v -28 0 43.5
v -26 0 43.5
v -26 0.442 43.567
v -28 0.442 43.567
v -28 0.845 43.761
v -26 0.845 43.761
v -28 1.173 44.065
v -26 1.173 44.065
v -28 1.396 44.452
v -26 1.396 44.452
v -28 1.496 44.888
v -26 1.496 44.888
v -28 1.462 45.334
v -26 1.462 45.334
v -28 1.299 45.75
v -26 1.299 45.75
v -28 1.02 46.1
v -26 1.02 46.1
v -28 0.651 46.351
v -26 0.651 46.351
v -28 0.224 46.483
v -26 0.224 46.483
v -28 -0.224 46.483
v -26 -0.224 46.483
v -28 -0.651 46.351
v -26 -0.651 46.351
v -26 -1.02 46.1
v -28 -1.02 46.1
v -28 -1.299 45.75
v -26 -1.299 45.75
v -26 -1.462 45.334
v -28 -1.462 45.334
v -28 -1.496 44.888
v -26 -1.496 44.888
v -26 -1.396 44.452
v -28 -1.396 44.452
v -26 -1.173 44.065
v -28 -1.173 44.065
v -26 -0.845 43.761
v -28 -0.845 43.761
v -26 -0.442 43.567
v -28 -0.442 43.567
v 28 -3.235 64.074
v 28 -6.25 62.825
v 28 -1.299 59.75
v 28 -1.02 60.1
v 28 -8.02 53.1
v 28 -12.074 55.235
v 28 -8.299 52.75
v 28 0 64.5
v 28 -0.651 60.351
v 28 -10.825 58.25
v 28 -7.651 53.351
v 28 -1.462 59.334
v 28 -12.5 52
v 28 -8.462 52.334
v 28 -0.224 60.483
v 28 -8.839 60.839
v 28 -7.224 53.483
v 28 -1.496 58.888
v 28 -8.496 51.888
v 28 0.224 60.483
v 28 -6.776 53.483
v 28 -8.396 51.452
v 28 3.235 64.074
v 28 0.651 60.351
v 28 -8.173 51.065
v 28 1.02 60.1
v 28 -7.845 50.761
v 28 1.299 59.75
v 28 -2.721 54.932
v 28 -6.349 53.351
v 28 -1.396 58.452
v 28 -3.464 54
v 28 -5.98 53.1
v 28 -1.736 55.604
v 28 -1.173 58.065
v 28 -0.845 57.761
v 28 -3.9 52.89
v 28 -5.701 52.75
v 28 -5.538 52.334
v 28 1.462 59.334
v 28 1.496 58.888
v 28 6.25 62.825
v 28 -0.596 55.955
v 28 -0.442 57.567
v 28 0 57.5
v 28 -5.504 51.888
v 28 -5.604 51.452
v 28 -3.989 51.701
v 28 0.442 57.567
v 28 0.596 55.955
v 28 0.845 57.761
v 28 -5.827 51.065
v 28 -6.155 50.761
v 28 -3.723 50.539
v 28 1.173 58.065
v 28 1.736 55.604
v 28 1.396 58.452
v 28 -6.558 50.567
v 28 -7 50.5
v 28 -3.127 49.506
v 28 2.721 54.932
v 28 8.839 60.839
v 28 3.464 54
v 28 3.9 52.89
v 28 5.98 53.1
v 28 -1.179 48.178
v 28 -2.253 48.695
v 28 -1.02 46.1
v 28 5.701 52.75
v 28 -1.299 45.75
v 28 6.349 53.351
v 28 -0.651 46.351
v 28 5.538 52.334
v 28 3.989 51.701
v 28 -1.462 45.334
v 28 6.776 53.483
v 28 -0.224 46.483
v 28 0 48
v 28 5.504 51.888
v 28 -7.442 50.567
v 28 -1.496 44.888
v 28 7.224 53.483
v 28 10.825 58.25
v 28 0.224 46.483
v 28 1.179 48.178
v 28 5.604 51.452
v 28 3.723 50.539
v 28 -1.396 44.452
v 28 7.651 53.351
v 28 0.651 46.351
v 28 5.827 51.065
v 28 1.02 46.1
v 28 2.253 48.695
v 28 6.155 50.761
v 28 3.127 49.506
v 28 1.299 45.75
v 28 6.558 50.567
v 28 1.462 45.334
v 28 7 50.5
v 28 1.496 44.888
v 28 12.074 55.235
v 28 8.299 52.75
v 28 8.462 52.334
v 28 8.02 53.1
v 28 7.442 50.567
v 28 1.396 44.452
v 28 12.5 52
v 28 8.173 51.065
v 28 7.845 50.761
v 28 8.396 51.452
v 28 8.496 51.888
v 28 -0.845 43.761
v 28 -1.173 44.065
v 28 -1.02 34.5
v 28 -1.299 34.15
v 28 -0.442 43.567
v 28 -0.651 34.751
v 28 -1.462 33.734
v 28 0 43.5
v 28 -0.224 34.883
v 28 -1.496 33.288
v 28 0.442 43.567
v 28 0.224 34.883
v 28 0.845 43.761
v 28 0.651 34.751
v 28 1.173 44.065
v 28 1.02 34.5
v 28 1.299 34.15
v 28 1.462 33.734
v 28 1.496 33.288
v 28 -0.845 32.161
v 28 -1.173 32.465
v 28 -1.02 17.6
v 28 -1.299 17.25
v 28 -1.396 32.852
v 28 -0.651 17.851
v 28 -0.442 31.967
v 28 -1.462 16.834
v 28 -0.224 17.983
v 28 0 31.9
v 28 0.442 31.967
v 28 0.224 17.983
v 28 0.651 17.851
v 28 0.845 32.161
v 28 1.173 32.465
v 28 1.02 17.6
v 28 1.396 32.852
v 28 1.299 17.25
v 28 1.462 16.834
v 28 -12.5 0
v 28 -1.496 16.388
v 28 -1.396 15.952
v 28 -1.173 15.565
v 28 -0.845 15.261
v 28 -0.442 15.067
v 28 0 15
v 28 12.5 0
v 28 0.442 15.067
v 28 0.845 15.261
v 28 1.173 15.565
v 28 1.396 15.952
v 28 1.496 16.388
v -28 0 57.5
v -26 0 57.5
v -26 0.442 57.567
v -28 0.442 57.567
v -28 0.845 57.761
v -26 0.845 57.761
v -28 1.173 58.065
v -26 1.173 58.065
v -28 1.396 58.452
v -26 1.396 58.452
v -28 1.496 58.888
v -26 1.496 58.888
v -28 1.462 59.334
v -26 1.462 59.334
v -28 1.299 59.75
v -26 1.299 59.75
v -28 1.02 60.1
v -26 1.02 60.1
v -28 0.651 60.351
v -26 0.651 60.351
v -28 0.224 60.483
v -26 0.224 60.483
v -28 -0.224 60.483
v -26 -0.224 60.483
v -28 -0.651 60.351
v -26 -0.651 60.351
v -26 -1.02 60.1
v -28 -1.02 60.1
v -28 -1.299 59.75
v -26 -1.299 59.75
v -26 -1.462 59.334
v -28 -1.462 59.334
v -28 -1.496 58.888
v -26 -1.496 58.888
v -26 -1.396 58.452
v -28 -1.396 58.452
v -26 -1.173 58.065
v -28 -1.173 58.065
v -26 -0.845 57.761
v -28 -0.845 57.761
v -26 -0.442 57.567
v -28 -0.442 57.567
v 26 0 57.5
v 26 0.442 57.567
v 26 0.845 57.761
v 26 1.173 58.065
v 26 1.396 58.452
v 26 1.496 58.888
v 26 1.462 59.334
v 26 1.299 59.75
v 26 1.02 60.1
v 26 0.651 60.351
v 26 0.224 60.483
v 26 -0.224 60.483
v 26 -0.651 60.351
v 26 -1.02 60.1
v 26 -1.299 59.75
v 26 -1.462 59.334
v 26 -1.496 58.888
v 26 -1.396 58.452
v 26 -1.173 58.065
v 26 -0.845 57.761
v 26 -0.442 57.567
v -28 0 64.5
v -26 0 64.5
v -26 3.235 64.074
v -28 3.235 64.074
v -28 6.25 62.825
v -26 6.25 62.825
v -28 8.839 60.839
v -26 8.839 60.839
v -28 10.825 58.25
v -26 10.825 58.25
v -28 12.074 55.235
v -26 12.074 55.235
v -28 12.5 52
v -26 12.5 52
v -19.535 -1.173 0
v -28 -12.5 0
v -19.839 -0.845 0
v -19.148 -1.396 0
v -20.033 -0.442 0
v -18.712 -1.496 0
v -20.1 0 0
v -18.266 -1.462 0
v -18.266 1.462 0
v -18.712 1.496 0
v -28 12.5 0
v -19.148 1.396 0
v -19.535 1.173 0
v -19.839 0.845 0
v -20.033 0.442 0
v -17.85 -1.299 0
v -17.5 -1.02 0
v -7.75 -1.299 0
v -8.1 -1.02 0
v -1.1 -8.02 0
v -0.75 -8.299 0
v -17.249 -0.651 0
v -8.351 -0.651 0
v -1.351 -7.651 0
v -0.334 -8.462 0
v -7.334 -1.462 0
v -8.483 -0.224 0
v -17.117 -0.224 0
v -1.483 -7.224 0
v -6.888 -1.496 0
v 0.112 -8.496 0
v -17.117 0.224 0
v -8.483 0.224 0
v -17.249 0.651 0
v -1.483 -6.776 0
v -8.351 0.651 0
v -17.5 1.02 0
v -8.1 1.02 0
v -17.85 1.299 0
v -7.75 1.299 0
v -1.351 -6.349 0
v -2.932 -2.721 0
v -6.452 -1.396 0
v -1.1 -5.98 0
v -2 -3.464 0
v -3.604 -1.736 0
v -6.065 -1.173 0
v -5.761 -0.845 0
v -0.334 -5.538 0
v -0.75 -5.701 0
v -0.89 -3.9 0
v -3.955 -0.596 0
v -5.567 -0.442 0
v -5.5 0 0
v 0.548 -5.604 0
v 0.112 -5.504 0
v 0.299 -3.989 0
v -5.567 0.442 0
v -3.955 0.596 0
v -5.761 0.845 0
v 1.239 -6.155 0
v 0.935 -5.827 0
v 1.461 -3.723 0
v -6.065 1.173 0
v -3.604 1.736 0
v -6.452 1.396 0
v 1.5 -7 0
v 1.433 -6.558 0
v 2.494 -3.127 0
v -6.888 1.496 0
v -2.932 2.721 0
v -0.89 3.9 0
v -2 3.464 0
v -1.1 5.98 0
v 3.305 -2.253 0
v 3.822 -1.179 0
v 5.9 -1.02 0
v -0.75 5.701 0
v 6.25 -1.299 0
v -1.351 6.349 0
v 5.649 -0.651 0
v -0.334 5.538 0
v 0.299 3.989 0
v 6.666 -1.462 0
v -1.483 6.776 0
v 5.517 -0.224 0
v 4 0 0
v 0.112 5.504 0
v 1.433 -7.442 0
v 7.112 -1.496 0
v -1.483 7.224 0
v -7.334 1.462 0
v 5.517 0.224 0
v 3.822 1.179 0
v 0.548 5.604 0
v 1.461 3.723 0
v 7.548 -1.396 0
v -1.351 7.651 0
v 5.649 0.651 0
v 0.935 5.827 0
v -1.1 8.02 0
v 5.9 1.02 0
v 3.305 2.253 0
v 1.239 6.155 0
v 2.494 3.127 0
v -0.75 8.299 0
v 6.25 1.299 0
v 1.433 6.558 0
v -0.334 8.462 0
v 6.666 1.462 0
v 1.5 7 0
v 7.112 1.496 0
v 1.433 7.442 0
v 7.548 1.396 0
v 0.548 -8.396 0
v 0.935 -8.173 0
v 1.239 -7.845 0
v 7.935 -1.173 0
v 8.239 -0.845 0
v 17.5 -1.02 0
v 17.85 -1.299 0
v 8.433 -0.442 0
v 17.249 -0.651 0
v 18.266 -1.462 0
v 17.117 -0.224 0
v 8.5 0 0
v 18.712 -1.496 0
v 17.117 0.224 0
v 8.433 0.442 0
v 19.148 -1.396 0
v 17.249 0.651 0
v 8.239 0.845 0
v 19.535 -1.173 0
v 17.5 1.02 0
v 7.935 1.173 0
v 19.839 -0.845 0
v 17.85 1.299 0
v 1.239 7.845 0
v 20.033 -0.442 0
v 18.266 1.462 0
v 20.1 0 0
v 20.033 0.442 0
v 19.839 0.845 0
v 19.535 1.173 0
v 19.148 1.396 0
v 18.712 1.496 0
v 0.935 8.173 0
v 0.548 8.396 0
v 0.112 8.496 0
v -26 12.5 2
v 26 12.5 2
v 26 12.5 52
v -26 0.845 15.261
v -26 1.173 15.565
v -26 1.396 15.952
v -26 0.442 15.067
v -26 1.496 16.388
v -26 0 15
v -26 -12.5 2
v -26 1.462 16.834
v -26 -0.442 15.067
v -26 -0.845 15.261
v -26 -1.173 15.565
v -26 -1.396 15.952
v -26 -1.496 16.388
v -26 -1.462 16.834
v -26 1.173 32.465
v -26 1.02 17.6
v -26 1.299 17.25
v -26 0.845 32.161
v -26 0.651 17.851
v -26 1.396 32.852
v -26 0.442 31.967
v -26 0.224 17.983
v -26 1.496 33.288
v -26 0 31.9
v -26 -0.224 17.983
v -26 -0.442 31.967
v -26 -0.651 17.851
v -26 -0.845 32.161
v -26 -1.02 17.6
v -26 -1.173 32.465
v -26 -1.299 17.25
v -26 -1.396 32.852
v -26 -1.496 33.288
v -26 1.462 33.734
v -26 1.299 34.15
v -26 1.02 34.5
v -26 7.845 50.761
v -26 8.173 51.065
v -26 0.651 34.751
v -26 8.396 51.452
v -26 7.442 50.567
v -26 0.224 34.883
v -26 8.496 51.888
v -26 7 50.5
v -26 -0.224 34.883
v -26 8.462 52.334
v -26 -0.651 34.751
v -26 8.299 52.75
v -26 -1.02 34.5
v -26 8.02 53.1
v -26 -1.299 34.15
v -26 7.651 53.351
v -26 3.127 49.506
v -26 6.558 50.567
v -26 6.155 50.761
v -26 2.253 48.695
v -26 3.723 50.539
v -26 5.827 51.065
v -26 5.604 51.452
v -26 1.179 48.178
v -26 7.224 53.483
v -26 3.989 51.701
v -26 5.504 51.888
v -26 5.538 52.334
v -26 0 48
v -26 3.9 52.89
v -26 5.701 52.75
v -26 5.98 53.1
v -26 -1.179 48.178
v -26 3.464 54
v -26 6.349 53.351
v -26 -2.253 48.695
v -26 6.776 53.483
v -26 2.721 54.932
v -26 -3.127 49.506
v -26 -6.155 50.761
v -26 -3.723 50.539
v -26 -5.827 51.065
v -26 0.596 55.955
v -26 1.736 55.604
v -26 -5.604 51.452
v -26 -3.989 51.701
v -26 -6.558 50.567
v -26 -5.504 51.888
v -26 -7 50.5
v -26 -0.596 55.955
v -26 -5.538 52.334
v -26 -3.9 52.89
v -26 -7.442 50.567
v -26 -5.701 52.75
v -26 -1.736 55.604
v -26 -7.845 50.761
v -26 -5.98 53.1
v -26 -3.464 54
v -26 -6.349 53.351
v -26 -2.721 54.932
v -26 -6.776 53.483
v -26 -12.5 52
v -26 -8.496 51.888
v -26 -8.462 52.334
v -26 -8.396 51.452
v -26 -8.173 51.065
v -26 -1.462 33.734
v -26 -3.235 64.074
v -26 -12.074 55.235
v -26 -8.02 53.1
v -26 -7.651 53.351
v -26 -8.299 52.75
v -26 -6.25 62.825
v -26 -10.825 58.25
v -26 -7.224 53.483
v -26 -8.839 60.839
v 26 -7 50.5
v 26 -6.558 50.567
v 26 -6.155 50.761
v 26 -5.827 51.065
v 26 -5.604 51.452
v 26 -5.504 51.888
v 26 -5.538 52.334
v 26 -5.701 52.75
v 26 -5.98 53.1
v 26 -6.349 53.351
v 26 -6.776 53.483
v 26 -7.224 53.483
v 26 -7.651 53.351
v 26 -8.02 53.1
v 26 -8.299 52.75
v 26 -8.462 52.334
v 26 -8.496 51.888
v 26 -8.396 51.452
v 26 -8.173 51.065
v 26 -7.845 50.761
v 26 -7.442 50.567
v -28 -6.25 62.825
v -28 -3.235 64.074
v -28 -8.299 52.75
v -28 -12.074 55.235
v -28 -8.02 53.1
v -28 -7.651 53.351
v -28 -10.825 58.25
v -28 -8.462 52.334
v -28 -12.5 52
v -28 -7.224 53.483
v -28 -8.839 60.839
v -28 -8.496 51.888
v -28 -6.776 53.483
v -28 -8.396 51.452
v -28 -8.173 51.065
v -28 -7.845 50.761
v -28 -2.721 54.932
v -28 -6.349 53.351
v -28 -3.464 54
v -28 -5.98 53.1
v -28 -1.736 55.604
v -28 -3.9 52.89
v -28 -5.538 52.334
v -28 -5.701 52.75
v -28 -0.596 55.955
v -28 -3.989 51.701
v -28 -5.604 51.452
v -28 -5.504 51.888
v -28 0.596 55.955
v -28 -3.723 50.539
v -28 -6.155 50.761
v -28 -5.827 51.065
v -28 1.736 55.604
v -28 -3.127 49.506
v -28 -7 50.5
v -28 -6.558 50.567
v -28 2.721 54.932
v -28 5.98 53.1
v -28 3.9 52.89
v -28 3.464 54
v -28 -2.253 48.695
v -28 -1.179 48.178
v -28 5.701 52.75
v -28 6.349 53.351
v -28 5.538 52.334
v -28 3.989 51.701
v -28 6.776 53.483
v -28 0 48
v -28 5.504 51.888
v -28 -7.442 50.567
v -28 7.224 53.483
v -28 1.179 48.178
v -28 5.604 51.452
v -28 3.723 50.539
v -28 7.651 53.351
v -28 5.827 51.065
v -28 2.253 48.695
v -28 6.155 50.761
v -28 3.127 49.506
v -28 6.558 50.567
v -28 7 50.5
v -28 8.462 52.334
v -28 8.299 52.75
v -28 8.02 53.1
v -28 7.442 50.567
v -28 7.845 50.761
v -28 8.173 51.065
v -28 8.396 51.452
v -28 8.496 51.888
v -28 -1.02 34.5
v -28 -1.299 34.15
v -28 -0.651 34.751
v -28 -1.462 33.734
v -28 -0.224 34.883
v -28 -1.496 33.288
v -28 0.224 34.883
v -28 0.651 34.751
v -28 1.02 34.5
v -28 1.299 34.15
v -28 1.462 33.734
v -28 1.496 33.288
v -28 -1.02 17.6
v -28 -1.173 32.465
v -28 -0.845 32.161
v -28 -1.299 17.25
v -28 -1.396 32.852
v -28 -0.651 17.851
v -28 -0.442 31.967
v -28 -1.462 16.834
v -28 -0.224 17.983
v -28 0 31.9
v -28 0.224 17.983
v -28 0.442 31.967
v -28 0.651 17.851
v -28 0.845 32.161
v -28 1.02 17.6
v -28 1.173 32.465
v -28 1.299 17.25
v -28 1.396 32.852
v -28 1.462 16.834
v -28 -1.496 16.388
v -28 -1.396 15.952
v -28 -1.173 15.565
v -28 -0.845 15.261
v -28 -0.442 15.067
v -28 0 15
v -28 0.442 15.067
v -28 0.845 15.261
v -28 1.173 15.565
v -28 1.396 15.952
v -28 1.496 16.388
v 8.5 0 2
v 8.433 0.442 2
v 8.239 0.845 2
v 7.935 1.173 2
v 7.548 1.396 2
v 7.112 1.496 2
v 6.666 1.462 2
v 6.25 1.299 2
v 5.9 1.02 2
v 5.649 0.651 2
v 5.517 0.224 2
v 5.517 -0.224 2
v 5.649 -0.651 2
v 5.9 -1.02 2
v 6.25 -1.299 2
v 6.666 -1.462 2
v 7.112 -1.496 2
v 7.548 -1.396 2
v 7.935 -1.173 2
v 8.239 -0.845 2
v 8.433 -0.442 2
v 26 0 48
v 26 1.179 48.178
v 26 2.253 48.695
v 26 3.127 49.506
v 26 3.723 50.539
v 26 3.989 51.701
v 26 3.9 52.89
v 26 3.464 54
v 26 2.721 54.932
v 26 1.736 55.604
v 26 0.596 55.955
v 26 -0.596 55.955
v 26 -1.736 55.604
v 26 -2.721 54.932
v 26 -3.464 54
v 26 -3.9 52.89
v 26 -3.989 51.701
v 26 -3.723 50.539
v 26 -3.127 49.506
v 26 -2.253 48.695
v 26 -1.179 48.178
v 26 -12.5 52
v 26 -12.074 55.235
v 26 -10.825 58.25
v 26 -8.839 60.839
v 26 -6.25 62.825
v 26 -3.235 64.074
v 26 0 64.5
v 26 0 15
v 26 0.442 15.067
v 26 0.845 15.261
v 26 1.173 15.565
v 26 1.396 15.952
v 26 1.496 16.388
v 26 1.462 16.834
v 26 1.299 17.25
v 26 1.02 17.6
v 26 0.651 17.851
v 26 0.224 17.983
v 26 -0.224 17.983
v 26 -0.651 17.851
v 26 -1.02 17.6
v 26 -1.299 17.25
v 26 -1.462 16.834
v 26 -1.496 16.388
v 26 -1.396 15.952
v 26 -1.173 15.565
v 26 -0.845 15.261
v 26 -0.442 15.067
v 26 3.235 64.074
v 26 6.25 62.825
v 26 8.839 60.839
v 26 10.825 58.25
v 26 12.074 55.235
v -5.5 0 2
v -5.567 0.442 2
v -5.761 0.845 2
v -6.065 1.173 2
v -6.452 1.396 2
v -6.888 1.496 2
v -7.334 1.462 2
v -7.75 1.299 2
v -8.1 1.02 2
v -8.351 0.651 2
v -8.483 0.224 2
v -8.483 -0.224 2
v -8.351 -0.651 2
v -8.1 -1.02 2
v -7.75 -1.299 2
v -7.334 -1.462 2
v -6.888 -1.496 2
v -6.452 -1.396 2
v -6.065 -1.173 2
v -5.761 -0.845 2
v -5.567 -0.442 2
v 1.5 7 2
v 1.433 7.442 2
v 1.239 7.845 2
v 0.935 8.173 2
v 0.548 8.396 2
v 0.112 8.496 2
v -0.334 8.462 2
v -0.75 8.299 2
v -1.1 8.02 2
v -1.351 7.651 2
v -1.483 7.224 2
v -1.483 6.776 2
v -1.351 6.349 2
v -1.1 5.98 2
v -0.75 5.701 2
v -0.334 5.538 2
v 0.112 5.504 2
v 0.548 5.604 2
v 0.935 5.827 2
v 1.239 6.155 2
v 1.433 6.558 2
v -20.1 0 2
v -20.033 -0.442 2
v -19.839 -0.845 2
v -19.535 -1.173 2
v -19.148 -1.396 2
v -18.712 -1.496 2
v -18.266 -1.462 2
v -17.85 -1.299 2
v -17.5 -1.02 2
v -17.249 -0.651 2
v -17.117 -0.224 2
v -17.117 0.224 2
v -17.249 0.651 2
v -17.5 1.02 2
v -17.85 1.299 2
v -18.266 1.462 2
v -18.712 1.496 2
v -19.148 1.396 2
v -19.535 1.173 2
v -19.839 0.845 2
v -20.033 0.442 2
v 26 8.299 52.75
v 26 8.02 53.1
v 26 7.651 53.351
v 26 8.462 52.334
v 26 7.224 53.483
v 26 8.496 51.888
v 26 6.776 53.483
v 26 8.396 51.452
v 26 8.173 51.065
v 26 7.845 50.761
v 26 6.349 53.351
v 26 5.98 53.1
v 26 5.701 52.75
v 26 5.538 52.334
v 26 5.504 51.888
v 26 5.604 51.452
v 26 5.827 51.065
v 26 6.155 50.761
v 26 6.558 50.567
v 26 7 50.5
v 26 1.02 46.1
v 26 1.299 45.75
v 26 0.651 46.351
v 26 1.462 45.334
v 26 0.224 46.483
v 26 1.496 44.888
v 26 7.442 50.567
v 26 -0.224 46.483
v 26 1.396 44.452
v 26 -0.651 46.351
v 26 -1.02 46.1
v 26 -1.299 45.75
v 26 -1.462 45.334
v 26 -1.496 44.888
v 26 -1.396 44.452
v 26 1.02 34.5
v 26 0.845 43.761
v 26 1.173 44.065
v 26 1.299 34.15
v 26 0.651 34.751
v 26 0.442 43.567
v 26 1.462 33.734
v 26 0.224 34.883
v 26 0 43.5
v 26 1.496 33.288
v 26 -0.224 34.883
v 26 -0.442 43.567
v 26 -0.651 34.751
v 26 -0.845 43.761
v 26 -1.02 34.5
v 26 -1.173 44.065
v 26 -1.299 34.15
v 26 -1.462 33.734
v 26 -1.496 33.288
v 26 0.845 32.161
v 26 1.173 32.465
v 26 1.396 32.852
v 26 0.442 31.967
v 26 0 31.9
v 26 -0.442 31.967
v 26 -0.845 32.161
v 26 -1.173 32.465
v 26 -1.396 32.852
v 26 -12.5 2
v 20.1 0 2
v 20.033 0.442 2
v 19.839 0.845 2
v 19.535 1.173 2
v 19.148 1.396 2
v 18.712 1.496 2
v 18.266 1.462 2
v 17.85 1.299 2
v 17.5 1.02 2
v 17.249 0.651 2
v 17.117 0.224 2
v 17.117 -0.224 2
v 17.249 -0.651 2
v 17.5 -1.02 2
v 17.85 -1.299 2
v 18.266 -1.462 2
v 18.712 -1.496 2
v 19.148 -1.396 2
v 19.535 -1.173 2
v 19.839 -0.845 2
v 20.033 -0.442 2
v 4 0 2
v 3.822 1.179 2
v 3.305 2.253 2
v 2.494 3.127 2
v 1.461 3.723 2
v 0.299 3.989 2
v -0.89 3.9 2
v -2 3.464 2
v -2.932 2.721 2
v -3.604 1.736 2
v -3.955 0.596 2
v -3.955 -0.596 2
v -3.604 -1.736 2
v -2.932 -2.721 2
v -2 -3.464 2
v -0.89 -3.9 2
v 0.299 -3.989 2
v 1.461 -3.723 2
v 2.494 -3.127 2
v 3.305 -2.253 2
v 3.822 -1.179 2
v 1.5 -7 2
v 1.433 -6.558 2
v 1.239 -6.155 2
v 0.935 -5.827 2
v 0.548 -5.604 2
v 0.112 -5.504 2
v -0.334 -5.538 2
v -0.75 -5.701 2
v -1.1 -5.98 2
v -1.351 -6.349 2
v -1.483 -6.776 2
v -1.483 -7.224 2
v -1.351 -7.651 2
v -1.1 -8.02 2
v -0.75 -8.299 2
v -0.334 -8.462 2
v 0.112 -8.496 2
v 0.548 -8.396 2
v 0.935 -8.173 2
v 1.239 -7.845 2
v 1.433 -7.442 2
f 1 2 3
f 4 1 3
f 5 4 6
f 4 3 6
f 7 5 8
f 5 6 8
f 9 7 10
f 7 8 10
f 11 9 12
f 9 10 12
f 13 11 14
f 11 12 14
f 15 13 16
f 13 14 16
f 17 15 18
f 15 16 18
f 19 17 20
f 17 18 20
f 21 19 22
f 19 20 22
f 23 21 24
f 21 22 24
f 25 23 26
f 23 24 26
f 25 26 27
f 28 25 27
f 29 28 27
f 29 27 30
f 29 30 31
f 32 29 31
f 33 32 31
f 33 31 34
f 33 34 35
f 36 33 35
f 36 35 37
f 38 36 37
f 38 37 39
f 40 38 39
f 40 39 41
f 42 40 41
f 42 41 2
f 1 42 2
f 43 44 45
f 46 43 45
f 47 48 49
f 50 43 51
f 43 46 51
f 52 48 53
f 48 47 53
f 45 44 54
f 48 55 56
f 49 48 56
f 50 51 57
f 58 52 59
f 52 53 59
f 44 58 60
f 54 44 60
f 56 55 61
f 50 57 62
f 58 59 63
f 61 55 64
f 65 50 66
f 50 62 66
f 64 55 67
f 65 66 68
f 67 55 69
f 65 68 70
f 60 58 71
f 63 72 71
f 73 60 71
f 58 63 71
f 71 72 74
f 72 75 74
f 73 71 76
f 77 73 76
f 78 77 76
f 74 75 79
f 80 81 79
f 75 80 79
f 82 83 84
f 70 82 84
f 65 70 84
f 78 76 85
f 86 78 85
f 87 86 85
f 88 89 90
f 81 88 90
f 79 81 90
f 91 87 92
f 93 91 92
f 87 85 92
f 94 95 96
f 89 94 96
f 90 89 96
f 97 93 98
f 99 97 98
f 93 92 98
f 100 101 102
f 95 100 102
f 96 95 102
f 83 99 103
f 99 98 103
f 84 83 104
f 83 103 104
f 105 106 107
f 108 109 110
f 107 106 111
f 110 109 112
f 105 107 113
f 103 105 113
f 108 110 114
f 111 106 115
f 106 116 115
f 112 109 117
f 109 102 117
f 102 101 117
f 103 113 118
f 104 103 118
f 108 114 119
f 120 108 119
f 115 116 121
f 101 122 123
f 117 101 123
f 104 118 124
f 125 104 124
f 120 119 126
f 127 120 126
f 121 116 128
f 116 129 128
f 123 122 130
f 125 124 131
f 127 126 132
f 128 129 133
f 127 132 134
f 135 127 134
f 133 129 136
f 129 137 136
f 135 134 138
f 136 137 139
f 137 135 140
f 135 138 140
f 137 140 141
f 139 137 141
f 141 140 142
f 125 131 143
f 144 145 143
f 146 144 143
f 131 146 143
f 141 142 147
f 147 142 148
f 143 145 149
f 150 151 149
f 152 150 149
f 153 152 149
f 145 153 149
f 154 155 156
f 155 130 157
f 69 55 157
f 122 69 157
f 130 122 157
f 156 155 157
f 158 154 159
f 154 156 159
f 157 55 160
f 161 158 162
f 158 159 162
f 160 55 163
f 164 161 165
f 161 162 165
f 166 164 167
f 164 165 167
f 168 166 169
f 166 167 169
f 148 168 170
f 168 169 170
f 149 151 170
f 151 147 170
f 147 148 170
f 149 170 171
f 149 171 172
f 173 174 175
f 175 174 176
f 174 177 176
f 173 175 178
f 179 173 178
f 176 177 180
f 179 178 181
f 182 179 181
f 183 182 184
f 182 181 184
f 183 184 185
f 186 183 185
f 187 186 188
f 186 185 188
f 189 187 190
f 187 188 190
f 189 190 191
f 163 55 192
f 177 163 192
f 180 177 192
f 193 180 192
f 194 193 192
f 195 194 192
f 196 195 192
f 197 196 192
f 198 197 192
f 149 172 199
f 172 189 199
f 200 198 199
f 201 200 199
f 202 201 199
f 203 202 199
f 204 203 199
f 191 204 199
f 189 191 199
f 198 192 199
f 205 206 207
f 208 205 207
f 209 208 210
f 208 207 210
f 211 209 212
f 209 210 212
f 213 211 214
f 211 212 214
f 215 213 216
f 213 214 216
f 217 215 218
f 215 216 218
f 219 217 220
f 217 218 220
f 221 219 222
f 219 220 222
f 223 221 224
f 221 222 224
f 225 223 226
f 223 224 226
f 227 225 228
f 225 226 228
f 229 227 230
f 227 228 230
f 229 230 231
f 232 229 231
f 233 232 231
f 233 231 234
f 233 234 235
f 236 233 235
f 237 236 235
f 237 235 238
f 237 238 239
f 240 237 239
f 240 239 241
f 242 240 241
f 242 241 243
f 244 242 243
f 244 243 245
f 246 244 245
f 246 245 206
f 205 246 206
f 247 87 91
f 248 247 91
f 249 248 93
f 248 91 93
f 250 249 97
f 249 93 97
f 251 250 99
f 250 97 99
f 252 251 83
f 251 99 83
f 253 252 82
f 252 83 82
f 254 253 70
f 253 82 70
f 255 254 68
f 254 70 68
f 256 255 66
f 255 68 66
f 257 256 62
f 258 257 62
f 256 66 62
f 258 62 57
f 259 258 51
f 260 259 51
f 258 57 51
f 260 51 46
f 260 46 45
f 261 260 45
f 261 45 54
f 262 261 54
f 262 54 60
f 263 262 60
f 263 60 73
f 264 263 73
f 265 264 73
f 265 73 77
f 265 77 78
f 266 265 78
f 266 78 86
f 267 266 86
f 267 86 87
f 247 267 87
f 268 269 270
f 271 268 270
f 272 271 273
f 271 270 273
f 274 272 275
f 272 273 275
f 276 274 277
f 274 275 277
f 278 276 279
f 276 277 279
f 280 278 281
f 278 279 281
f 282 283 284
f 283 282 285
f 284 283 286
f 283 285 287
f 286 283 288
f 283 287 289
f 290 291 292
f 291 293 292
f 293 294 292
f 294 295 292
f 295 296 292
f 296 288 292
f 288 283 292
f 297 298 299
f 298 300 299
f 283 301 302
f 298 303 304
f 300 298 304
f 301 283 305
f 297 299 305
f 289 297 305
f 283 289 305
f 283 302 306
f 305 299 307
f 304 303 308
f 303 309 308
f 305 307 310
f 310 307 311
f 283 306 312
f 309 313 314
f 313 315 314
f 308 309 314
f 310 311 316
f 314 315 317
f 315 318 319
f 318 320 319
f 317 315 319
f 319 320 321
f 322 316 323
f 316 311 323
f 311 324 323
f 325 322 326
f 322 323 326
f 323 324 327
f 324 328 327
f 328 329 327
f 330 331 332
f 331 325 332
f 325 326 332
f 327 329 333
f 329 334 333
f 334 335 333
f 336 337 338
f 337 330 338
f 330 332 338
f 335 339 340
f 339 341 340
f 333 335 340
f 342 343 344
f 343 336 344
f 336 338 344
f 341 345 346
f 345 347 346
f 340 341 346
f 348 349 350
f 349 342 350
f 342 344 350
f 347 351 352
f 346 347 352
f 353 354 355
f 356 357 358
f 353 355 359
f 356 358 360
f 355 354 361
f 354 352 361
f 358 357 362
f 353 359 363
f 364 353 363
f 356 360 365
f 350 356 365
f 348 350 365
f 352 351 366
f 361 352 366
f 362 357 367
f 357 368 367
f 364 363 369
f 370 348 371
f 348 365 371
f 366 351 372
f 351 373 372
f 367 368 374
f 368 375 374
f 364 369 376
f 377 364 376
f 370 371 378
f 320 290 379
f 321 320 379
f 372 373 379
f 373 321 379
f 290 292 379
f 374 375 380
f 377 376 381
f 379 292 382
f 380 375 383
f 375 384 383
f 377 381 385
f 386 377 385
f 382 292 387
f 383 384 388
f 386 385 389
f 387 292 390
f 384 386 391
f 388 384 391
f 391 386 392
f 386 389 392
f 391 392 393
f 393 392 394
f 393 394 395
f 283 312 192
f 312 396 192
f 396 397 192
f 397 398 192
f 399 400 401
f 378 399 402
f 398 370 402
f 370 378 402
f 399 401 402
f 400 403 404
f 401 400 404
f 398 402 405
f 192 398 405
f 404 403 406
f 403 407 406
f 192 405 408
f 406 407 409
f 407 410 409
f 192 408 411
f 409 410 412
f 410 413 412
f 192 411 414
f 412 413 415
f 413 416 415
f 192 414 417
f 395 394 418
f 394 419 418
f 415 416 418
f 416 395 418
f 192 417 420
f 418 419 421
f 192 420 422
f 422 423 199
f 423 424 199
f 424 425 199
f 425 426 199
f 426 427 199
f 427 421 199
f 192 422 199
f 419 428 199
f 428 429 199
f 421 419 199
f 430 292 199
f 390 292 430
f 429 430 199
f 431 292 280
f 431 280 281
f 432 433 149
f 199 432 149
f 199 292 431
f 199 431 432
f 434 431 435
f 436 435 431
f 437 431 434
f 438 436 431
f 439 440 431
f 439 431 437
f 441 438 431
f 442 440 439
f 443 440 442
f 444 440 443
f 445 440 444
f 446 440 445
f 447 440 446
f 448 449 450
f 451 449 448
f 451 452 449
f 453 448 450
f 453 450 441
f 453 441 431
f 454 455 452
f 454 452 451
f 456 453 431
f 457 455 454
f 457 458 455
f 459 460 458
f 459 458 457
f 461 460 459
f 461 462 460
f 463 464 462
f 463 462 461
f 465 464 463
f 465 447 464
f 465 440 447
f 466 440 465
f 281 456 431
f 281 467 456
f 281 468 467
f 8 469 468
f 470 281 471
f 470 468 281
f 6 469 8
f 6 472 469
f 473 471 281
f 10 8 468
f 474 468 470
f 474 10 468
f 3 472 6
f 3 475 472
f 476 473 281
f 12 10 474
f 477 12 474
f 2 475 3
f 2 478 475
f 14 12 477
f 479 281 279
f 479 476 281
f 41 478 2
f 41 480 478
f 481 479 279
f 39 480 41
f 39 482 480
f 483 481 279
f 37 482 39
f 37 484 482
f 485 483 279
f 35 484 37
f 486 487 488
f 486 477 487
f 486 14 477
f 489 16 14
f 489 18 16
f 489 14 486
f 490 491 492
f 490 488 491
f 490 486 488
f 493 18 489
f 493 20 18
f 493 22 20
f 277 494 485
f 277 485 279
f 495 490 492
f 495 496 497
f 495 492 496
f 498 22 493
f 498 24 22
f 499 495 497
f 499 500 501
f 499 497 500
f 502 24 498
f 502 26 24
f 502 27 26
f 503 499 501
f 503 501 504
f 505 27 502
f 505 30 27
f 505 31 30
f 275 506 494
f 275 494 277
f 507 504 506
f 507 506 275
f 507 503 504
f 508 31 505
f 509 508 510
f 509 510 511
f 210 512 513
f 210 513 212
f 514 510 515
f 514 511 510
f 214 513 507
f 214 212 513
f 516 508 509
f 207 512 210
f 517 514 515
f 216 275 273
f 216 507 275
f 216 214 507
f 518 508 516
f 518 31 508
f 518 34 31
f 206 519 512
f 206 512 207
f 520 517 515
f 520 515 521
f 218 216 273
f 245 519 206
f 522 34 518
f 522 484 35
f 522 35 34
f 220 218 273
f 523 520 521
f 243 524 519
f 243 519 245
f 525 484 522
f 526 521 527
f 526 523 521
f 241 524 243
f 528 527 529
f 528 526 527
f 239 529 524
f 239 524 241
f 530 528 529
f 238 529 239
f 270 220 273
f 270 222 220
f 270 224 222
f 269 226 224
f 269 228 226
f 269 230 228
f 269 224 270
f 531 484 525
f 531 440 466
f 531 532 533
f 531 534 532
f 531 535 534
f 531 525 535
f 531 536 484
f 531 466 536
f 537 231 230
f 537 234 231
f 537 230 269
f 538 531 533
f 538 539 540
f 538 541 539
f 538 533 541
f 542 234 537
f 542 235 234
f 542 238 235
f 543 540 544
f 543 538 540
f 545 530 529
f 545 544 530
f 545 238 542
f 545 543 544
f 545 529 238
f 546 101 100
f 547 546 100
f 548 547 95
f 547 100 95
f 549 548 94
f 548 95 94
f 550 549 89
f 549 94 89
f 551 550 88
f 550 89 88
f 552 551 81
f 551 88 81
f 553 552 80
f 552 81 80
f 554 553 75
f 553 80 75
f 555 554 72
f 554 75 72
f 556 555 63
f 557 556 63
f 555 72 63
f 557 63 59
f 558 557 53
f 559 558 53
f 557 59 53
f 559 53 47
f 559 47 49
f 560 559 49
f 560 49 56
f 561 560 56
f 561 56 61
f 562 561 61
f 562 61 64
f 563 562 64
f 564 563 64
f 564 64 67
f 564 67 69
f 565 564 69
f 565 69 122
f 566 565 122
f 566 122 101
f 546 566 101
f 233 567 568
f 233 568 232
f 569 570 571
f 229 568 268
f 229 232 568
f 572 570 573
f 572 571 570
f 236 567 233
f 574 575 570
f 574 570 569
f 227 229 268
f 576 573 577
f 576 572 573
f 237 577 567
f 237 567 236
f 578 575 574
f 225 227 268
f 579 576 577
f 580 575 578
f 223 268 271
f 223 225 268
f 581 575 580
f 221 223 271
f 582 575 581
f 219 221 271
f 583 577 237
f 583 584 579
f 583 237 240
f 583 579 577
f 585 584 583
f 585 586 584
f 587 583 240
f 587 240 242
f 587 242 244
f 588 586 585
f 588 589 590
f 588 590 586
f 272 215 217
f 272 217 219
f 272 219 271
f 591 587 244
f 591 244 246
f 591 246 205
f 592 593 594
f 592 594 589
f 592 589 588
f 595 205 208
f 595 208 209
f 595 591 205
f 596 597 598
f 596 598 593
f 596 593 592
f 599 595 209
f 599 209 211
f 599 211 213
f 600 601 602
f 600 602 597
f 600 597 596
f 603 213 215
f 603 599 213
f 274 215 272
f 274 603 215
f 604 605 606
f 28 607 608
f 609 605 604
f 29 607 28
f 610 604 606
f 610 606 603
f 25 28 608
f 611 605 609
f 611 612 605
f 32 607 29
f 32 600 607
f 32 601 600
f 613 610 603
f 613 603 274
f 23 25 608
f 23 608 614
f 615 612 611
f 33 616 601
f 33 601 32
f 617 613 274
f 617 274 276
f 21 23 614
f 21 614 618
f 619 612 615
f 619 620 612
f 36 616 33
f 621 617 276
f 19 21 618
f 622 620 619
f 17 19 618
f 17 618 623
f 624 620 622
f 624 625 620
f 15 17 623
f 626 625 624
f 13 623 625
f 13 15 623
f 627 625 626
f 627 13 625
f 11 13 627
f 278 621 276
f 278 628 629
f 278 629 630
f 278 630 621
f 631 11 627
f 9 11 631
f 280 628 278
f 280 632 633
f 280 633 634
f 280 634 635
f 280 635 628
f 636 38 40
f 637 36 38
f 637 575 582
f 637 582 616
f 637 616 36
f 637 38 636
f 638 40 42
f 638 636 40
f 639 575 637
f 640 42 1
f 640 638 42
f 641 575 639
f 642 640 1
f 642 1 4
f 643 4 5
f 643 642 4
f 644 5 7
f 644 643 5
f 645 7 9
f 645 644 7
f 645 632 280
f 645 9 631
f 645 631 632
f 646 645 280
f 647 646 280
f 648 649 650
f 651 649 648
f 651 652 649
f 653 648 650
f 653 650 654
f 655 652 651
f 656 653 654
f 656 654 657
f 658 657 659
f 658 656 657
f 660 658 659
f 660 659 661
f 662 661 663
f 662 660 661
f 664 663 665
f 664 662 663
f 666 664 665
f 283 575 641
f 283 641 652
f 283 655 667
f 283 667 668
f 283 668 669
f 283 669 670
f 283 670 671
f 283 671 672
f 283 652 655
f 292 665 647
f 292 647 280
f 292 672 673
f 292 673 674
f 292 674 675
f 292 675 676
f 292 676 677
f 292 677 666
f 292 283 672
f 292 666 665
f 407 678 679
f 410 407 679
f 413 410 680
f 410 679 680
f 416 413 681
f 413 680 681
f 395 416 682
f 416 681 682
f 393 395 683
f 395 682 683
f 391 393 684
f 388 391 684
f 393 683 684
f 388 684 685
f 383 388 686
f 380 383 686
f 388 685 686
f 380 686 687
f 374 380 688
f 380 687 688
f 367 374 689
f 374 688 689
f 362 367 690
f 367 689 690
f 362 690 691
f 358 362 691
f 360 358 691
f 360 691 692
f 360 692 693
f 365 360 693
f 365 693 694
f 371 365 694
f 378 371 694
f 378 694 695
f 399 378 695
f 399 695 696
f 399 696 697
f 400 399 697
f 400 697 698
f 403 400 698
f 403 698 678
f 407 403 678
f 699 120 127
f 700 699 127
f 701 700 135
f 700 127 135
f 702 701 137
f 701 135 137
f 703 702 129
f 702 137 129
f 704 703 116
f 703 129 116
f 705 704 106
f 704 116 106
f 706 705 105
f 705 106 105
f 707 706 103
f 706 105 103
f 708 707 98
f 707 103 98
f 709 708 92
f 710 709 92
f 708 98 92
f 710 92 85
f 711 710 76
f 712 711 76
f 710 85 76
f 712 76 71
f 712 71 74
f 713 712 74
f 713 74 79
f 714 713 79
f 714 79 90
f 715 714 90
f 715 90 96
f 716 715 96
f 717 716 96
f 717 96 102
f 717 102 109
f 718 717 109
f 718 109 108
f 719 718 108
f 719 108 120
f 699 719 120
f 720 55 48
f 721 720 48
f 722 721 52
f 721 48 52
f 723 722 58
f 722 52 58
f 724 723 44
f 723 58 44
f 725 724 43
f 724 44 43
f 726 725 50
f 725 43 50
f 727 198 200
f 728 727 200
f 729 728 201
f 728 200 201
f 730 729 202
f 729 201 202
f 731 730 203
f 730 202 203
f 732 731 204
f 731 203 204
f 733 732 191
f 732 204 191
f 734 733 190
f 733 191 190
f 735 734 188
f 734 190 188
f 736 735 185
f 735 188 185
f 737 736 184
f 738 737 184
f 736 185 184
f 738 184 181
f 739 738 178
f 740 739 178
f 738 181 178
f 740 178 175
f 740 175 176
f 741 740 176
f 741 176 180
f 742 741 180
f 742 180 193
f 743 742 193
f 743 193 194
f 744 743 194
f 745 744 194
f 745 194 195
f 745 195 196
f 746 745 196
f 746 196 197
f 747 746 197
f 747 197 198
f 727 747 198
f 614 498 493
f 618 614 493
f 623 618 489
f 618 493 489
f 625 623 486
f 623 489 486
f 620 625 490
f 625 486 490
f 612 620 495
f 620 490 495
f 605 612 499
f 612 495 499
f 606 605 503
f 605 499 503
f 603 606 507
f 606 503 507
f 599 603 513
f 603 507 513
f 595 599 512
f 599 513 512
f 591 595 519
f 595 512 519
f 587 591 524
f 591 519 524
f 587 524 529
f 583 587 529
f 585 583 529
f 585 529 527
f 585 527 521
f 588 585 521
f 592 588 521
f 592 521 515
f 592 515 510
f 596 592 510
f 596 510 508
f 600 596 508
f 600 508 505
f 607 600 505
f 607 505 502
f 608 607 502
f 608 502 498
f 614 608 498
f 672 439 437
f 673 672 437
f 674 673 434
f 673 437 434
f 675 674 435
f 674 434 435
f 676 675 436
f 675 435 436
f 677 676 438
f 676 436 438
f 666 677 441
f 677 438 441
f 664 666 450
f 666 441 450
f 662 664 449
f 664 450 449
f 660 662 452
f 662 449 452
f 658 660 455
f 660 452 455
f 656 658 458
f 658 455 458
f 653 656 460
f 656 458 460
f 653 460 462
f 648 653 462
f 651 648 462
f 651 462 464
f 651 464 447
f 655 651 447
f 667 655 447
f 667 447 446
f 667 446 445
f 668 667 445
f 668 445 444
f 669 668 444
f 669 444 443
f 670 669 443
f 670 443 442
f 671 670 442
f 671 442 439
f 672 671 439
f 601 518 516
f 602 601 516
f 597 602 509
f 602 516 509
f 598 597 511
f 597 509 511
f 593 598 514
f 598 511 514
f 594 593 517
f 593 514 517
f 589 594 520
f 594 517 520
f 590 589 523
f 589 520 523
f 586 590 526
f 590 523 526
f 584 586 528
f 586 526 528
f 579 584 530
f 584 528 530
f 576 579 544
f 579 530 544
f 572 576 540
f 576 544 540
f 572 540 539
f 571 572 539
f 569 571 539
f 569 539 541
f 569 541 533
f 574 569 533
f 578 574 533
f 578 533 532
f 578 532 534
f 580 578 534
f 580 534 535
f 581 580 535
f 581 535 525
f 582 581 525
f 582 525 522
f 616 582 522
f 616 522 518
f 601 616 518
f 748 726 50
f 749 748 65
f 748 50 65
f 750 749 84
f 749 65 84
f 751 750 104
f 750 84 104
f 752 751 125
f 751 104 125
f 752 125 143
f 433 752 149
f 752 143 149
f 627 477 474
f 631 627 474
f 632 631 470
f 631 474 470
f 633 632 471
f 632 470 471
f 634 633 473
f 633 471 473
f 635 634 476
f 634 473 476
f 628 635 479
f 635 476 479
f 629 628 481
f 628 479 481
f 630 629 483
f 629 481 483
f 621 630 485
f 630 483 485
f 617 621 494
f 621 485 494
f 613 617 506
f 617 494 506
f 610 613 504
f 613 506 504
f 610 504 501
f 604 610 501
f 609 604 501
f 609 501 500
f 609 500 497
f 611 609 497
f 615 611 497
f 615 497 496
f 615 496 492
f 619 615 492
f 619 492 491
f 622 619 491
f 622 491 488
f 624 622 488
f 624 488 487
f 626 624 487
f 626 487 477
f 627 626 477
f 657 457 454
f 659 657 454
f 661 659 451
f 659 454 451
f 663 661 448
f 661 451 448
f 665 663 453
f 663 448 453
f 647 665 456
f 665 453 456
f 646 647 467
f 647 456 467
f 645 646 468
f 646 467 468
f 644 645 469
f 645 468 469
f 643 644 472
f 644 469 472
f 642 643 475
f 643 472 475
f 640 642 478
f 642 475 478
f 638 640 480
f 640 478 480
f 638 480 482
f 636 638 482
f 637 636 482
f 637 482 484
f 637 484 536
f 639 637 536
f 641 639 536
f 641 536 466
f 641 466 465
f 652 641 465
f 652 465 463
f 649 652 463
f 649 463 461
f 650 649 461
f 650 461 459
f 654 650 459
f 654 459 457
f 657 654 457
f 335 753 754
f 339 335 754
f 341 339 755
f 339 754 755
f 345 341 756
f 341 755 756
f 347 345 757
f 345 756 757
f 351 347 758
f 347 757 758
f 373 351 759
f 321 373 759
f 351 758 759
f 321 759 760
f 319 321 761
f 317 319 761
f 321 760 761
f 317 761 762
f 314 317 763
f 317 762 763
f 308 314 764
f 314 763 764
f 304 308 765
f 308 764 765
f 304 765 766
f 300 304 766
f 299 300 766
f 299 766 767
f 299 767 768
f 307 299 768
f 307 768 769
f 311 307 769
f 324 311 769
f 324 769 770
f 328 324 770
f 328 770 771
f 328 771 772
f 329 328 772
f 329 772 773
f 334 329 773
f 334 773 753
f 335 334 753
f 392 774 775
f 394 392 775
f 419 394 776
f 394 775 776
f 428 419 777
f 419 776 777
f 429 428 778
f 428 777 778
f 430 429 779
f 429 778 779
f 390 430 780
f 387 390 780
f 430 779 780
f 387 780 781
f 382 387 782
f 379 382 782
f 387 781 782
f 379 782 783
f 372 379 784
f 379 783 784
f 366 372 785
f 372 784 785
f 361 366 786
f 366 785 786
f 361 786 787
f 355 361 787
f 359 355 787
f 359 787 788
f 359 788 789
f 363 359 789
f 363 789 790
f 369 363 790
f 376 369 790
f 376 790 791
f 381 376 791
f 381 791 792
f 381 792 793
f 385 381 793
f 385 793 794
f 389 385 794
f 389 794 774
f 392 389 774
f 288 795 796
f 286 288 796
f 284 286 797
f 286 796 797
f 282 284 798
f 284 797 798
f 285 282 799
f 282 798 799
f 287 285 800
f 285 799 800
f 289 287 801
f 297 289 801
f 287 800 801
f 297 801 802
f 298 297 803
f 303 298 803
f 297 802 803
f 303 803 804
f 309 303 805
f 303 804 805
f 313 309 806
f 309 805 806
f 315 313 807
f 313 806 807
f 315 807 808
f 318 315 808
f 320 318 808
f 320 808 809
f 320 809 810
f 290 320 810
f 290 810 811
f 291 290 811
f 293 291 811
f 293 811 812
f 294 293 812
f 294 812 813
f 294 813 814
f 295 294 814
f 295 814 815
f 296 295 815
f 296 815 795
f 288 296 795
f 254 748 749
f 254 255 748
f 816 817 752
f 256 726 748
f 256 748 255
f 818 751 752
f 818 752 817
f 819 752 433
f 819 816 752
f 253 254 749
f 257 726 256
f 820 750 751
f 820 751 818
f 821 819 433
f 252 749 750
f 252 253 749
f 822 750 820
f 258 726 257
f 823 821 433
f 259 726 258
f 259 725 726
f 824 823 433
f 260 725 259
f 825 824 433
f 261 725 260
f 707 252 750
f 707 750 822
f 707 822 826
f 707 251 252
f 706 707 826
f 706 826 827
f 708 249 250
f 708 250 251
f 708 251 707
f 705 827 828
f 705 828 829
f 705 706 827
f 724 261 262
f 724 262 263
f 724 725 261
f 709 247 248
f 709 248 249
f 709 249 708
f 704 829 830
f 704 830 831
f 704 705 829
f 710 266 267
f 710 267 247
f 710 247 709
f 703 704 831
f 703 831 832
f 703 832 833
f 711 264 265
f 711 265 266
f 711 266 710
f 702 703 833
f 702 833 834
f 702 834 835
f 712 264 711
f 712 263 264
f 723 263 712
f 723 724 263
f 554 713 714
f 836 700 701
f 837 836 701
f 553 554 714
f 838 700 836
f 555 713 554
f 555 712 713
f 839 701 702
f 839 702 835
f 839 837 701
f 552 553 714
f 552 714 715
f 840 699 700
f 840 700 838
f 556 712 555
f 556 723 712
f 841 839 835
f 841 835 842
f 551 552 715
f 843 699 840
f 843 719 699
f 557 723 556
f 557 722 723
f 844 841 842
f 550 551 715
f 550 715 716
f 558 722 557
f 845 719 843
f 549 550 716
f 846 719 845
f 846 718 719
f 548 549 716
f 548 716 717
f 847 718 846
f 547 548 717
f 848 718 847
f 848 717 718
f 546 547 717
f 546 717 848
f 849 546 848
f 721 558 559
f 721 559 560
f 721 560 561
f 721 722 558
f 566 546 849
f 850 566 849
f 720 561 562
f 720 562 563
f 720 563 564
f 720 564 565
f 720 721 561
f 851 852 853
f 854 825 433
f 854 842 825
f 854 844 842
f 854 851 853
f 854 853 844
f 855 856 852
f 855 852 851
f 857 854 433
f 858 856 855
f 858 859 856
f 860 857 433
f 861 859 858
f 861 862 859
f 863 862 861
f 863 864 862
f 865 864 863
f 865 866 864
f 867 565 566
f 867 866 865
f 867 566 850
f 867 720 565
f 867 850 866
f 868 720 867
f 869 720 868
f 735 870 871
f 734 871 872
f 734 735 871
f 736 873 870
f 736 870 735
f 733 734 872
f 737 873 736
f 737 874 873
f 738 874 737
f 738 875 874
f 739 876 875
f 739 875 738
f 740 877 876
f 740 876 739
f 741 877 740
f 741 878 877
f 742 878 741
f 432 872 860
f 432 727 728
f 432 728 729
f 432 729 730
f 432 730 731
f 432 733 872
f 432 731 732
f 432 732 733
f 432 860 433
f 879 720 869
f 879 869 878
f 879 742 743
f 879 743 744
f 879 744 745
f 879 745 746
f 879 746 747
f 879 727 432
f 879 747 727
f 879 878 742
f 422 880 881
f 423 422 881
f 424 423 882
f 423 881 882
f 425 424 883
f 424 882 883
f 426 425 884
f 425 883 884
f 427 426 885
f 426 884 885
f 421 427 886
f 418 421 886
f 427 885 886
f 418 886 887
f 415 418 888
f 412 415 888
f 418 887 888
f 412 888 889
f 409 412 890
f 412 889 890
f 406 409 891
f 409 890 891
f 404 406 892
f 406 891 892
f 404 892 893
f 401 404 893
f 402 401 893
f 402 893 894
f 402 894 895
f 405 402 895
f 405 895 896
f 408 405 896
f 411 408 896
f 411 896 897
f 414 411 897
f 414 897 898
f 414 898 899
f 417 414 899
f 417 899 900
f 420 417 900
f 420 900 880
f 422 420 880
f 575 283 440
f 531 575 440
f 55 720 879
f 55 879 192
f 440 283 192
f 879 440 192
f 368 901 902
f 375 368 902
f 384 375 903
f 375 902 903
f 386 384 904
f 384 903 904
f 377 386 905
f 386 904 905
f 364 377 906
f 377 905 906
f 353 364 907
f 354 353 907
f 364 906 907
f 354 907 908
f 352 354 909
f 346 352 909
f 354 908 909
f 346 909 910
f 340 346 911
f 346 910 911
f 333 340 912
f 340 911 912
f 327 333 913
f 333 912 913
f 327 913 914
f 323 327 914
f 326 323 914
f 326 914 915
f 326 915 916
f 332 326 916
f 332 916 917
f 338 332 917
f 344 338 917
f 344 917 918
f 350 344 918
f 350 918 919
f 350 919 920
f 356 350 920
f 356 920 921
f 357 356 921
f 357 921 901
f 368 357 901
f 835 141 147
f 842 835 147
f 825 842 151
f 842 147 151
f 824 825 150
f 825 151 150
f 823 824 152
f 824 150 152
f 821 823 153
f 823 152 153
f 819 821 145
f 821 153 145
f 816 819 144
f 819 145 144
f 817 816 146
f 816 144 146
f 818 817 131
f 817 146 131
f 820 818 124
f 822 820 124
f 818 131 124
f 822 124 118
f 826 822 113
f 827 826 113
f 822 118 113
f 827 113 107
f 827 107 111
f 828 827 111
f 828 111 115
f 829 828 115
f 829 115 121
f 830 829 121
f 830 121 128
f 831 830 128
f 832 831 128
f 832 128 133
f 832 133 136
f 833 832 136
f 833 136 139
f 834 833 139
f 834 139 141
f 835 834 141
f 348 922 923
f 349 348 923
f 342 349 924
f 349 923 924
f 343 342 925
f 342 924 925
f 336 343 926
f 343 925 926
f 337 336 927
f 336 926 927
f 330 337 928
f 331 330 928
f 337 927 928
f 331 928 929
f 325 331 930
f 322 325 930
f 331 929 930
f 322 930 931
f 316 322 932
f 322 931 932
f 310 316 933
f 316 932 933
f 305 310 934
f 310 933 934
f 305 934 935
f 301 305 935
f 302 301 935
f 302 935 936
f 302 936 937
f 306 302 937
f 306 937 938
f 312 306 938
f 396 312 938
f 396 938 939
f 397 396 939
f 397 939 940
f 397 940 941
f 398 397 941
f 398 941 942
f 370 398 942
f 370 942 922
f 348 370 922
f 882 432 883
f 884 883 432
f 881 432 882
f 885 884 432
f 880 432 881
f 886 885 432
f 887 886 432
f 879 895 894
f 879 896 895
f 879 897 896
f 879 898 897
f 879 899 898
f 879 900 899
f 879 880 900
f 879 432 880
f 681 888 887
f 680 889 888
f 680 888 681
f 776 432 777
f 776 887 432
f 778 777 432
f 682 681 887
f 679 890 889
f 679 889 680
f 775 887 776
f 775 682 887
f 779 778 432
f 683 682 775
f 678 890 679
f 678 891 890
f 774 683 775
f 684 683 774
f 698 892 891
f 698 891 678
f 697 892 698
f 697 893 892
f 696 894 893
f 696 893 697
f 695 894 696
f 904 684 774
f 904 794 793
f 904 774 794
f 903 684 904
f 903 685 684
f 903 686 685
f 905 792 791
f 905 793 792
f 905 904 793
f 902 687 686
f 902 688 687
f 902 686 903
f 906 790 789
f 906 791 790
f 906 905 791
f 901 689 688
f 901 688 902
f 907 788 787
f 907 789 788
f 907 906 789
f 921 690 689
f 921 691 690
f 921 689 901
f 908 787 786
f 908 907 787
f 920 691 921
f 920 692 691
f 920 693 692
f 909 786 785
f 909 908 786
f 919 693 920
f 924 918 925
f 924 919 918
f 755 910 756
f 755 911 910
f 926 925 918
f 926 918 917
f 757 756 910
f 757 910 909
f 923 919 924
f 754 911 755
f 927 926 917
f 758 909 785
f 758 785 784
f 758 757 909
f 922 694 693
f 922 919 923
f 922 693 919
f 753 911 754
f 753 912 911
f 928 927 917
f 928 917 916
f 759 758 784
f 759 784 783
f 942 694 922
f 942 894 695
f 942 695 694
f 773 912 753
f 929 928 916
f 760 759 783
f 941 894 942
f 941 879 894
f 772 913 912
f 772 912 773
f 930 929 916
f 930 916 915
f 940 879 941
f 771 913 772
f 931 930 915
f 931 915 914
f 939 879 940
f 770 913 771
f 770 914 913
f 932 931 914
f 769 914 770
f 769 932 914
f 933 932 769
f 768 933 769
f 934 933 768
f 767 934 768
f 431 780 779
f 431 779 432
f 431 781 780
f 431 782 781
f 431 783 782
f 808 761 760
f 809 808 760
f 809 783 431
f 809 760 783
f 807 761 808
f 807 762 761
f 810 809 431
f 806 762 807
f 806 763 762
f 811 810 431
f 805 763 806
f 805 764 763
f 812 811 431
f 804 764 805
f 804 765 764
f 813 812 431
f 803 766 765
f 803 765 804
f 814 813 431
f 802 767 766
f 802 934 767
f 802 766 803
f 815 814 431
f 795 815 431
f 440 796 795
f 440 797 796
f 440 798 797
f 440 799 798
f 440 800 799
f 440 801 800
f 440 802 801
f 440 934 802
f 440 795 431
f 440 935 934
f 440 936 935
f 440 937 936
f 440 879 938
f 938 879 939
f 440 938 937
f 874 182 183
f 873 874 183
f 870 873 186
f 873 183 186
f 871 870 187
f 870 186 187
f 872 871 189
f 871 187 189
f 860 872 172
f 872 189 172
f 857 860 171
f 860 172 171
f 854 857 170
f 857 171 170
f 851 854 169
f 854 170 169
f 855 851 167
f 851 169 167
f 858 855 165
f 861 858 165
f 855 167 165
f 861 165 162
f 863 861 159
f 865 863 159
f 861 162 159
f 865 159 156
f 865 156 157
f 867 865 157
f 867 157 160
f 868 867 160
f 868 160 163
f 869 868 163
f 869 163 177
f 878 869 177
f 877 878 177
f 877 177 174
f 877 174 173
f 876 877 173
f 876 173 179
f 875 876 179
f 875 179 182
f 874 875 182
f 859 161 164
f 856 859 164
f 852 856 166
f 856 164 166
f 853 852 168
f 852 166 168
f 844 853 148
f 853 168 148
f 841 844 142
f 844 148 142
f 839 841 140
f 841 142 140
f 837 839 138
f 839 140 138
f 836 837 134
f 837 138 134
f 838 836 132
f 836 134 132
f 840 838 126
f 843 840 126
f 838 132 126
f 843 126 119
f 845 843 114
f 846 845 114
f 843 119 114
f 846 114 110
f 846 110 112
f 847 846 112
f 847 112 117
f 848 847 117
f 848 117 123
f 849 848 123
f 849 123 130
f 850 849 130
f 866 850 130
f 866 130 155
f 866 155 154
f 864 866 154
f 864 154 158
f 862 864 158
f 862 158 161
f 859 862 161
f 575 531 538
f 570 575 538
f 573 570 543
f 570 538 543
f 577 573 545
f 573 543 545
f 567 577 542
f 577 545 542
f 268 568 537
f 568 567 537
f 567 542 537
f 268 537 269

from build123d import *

# Parameters (mm, degrees)
SKETCH_1_W          = 56
SKETCH_1_H          = 25
EXTRUDE_1_DEPTH     = 64.5
CUT_EXTRUDE_1_DEPTH = 75.627407834
SKETCH_4_R          = 4
SKETCH_4_R_2        = 1.5
CUT_EXTRUDE_3_DEPTH = 70.616808315
CUT_EXTRUDE_4_DEPTH = 87.327863405
SKETCH_5_R          = 4
SKETCH_5_R_2        = 1.5
CUT_EXTRUDE_5_DEPTH = 87.327863405


with BuildPart() as part:
    # 草图1 → 凸台-拉伸1 (new body)
    with BuildSketch(Plane.XY):
        Rectangle(SKETCH_1_W, SKETCH_1_H)
    extrude(amount=EXTRUDE_1_DEPTH)

    # 草图2 → 切除-拉伸1 (cut, through all)
    with BuildSketch(Plane.XZ.offset(12.5)):
        Polygon((0, 64.5), (26, 64.5), (26, 2), (-26, 2), (-26, 64.5), align=None)
    extrude(amount=-CUT_EXTRUDE_1_DEPTH, mode=Mode.SUBTRACT)

    # 草图4 → 切除-拉伸3 (cut, through all)
    with BuildSketch(Plane.XY.offset(2)):
        Circle(SKETCH_4_R)
        with Locations((0, 7)):
            Circle(SKETCH_4_R_2)
        with Locations((0, -7)):
            Circle(SKETCH_4_R_2)
        with Locations((-7, 0)):
            Circle(SKETCH_4_R_2)
        with Locations((7, 0)):
            Circle(SKETCH_4_R_2)
        with Locations((18.6, 0)):
            Circle(SKETCH_4_R_2)
        with Locations(Location((-18.6, 0, 0), (0, 0, 180))):
            Circle(SKETCH_4_R_2)
    extrude(amount=-CUT_EXTRUDE_3_DEPTH, mode=Mode.SUBTRACT)

    # 草图3 → 切除-拉伸4 (cut, through all)
    with BuildSketch(Plane(origin=(28, 0, 0), x_dir=(0, 0, -1), z_dir=(1, 0, 0))):
        with BuildLine():
            ThreePointArc((-64.5, 0), (-60.838834765, 8.838834765), (-52, 12.5))
            Line((-52, 12.5), (-64.5, 12.5))
            Line((-64.5, 12.5), (-64.5, 0))
        make_face()
        with BuildLine():
            ThreePointArc((-52, -12.5), (-60.838834765, -8.838834765), (-64.5, 0))
            Line((-64.5, 0), (-64.5, -12.5))
            Line((-64.5, -12.5), (-52, -12.5))
        make_face()
    extrude(amount=-CUT_EXTRUDE_4_DEPTH, mode=Mode.SUBTRACT)

    # 草图5 → 切除-拉伸5 (cut, through all)
    with BuildSketch(Plane(origin=(28, 0, 0), x_dir=(0, 0, -1), z_dir=(1, 0, 0))):
        with Locations((-52, 0)):
            Circle(SKETCH_5_R)
        with Locations((-52, 7)):
            Circle(SKETCH_5_R_2)
        with Locations((-59, 0)):
            Circle(SKETCH_5_R_2)
        with Locations((-52, -7)):
            Circle(SKETCH_5_R_2)
        with Locations((-45, 0)):
            Circle(SKETCH_5_R_2)
        with Locations((-33.4, 0)):
            Circle(SKETCH_5_R_2)
        with Locations((-16.5, 0)):
            Circle(SKETCH_5_R_2)
    extrude(amount=-CUT_EXTRUDE_5_DEPTH, mode=Mode.SUBTRACT)


solid = part.part
